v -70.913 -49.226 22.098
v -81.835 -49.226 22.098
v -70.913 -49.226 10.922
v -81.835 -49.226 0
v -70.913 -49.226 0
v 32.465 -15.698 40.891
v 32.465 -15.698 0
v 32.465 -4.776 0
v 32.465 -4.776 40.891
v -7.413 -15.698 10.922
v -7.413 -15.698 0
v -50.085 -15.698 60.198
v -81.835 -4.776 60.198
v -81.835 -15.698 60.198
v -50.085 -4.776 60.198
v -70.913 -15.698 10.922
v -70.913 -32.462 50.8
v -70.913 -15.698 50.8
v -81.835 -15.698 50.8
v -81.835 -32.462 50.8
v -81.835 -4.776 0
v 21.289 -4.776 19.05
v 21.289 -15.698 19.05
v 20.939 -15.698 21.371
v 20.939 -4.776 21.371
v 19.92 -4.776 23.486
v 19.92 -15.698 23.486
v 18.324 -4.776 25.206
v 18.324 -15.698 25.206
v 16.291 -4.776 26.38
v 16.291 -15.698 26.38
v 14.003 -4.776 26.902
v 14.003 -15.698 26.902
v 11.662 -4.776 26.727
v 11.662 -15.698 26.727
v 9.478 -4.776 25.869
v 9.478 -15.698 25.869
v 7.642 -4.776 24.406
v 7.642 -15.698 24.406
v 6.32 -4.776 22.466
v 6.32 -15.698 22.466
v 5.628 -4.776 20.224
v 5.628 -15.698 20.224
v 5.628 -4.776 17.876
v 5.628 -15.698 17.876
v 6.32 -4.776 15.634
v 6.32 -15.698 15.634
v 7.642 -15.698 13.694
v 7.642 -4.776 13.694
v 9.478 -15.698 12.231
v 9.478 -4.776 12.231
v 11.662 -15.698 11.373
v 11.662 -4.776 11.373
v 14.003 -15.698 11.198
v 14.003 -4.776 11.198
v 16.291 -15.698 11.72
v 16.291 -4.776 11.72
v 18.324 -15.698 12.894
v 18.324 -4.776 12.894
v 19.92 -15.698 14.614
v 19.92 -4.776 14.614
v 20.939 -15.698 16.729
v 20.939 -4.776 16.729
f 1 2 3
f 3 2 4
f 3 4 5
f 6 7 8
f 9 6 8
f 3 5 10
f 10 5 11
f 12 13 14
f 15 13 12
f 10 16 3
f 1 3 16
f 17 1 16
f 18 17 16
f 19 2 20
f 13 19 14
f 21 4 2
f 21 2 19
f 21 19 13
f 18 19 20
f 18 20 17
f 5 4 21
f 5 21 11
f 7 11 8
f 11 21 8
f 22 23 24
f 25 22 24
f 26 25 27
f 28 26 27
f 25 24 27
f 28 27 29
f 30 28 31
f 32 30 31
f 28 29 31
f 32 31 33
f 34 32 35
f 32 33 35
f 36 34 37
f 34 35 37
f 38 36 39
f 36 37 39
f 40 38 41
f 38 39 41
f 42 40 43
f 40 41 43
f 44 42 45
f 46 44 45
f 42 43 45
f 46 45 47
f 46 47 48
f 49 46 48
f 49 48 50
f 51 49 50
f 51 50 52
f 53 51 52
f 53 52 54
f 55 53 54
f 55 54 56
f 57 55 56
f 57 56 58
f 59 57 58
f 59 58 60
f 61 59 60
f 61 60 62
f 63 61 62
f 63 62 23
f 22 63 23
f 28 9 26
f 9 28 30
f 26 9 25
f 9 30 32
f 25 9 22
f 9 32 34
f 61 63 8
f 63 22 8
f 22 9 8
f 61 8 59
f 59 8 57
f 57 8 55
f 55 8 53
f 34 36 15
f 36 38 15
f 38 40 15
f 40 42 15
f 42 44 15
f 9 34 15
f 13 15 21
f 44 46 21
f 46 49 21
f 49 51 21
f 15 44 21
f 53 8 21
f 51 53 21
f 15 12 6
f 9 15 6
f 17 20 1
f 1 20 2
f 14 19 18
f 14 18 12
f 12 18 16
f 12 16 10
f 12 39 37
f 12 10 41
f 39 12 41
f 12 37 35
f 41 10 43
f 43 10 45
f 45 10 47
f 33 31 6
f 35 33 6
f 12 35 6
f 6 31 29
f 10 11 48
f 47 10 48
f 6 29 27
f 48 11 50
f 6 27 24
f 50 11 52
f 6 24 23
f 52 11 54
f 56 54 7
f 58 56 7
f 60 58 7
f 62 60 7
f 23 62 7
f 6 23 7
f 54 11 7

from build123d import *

# Parameters (mm, degrees)
F1_DEPTH = 60.198
F2_DEPTH = 60.198
F0_W     = 10.922
F0_H     = 33.528
F3_DEPTH = 50.8
F4_DEPTH = 10.922
F5_R     = 7.874
F6_DEPTH = 10.923
F7_DEPTH = 25.4
F9_DEPTH = 25.4


with BuildPart() as f1:
    # F0 (on Top) → F1 (new body)
    with BuildSketch(Plane.XY):
        Polygon((-70.913484, -4.775751), (-81.835484, -4.775751), (-81.835484, -15.697751), (-70.913484, -15.697751), (-50.085484, -15.697751), (-50.085484, -4.775751), align=None)
    extrude(amount=F1_DEPTH)

    # F0 (on Top) → F2 (join)
    with BuildSketch(Plane.XY):
        Polygon((32.464516, -4.775751), (-50.085484, -4.775751), (-50.085484, -15.697751), (-7.413484, -15.697751), (32.464516, -15.697751), align=None)
    extrude(amount=F2_DEPTH)

    # F0 (on Top) → F3 (join)
    with BuildSketch(Plane.XY):
        with Locations((-76.374484, -32.461751)):
            Rectangle(F0_W, F0_H)
    extrude(amount=F3_DEPTH)

    # F0 (on Top) → F4 (join)
    with BuildSketch(Plane.XY):
        Polygon((-50.085484, -15.697751), (-70.913484, -15.697751), (-70.913484, -49.225751), (-7.413484, -15.697751), align=None)
    extrude(amount=F4_DEPTH)

    # F5 (on face) → F6 (cut, through all)
    with BuildSketch(Plane.XZ.offset(15.697751)):
        with Locations((13.414516, 19.05)):
            Circle(F5_R)
    extrude(amount=-F6_DEPTH, mode=Mode.SUBTRACT)

    # F5 (on face) → F7 (cut)
    with BuildSketch(Plane.XZ.offset(15.697751)):
        Polygon((32.464516, 60.198), (-50.085484, 60.198), (32.464516, 40.890517), align=None)
    extrude(amount=-F7_DEPTH, mode=Mode.SUBTRACT)

    # F8 (on face) → F9 (cut)
    with BuildSketch(Plane(origin=(-81.835484, 0, 0), x_dir=(0, -1, 0), z_dir=(-1, 0, 0))):
        Polygon((49.225751, 50.8), (32.461751, 50.8), (49.225751, 22.098), align=None)
    extrude(amount=-F9_DEPTH, mode=Mode.SUBTRACT)


solid = f1.part
